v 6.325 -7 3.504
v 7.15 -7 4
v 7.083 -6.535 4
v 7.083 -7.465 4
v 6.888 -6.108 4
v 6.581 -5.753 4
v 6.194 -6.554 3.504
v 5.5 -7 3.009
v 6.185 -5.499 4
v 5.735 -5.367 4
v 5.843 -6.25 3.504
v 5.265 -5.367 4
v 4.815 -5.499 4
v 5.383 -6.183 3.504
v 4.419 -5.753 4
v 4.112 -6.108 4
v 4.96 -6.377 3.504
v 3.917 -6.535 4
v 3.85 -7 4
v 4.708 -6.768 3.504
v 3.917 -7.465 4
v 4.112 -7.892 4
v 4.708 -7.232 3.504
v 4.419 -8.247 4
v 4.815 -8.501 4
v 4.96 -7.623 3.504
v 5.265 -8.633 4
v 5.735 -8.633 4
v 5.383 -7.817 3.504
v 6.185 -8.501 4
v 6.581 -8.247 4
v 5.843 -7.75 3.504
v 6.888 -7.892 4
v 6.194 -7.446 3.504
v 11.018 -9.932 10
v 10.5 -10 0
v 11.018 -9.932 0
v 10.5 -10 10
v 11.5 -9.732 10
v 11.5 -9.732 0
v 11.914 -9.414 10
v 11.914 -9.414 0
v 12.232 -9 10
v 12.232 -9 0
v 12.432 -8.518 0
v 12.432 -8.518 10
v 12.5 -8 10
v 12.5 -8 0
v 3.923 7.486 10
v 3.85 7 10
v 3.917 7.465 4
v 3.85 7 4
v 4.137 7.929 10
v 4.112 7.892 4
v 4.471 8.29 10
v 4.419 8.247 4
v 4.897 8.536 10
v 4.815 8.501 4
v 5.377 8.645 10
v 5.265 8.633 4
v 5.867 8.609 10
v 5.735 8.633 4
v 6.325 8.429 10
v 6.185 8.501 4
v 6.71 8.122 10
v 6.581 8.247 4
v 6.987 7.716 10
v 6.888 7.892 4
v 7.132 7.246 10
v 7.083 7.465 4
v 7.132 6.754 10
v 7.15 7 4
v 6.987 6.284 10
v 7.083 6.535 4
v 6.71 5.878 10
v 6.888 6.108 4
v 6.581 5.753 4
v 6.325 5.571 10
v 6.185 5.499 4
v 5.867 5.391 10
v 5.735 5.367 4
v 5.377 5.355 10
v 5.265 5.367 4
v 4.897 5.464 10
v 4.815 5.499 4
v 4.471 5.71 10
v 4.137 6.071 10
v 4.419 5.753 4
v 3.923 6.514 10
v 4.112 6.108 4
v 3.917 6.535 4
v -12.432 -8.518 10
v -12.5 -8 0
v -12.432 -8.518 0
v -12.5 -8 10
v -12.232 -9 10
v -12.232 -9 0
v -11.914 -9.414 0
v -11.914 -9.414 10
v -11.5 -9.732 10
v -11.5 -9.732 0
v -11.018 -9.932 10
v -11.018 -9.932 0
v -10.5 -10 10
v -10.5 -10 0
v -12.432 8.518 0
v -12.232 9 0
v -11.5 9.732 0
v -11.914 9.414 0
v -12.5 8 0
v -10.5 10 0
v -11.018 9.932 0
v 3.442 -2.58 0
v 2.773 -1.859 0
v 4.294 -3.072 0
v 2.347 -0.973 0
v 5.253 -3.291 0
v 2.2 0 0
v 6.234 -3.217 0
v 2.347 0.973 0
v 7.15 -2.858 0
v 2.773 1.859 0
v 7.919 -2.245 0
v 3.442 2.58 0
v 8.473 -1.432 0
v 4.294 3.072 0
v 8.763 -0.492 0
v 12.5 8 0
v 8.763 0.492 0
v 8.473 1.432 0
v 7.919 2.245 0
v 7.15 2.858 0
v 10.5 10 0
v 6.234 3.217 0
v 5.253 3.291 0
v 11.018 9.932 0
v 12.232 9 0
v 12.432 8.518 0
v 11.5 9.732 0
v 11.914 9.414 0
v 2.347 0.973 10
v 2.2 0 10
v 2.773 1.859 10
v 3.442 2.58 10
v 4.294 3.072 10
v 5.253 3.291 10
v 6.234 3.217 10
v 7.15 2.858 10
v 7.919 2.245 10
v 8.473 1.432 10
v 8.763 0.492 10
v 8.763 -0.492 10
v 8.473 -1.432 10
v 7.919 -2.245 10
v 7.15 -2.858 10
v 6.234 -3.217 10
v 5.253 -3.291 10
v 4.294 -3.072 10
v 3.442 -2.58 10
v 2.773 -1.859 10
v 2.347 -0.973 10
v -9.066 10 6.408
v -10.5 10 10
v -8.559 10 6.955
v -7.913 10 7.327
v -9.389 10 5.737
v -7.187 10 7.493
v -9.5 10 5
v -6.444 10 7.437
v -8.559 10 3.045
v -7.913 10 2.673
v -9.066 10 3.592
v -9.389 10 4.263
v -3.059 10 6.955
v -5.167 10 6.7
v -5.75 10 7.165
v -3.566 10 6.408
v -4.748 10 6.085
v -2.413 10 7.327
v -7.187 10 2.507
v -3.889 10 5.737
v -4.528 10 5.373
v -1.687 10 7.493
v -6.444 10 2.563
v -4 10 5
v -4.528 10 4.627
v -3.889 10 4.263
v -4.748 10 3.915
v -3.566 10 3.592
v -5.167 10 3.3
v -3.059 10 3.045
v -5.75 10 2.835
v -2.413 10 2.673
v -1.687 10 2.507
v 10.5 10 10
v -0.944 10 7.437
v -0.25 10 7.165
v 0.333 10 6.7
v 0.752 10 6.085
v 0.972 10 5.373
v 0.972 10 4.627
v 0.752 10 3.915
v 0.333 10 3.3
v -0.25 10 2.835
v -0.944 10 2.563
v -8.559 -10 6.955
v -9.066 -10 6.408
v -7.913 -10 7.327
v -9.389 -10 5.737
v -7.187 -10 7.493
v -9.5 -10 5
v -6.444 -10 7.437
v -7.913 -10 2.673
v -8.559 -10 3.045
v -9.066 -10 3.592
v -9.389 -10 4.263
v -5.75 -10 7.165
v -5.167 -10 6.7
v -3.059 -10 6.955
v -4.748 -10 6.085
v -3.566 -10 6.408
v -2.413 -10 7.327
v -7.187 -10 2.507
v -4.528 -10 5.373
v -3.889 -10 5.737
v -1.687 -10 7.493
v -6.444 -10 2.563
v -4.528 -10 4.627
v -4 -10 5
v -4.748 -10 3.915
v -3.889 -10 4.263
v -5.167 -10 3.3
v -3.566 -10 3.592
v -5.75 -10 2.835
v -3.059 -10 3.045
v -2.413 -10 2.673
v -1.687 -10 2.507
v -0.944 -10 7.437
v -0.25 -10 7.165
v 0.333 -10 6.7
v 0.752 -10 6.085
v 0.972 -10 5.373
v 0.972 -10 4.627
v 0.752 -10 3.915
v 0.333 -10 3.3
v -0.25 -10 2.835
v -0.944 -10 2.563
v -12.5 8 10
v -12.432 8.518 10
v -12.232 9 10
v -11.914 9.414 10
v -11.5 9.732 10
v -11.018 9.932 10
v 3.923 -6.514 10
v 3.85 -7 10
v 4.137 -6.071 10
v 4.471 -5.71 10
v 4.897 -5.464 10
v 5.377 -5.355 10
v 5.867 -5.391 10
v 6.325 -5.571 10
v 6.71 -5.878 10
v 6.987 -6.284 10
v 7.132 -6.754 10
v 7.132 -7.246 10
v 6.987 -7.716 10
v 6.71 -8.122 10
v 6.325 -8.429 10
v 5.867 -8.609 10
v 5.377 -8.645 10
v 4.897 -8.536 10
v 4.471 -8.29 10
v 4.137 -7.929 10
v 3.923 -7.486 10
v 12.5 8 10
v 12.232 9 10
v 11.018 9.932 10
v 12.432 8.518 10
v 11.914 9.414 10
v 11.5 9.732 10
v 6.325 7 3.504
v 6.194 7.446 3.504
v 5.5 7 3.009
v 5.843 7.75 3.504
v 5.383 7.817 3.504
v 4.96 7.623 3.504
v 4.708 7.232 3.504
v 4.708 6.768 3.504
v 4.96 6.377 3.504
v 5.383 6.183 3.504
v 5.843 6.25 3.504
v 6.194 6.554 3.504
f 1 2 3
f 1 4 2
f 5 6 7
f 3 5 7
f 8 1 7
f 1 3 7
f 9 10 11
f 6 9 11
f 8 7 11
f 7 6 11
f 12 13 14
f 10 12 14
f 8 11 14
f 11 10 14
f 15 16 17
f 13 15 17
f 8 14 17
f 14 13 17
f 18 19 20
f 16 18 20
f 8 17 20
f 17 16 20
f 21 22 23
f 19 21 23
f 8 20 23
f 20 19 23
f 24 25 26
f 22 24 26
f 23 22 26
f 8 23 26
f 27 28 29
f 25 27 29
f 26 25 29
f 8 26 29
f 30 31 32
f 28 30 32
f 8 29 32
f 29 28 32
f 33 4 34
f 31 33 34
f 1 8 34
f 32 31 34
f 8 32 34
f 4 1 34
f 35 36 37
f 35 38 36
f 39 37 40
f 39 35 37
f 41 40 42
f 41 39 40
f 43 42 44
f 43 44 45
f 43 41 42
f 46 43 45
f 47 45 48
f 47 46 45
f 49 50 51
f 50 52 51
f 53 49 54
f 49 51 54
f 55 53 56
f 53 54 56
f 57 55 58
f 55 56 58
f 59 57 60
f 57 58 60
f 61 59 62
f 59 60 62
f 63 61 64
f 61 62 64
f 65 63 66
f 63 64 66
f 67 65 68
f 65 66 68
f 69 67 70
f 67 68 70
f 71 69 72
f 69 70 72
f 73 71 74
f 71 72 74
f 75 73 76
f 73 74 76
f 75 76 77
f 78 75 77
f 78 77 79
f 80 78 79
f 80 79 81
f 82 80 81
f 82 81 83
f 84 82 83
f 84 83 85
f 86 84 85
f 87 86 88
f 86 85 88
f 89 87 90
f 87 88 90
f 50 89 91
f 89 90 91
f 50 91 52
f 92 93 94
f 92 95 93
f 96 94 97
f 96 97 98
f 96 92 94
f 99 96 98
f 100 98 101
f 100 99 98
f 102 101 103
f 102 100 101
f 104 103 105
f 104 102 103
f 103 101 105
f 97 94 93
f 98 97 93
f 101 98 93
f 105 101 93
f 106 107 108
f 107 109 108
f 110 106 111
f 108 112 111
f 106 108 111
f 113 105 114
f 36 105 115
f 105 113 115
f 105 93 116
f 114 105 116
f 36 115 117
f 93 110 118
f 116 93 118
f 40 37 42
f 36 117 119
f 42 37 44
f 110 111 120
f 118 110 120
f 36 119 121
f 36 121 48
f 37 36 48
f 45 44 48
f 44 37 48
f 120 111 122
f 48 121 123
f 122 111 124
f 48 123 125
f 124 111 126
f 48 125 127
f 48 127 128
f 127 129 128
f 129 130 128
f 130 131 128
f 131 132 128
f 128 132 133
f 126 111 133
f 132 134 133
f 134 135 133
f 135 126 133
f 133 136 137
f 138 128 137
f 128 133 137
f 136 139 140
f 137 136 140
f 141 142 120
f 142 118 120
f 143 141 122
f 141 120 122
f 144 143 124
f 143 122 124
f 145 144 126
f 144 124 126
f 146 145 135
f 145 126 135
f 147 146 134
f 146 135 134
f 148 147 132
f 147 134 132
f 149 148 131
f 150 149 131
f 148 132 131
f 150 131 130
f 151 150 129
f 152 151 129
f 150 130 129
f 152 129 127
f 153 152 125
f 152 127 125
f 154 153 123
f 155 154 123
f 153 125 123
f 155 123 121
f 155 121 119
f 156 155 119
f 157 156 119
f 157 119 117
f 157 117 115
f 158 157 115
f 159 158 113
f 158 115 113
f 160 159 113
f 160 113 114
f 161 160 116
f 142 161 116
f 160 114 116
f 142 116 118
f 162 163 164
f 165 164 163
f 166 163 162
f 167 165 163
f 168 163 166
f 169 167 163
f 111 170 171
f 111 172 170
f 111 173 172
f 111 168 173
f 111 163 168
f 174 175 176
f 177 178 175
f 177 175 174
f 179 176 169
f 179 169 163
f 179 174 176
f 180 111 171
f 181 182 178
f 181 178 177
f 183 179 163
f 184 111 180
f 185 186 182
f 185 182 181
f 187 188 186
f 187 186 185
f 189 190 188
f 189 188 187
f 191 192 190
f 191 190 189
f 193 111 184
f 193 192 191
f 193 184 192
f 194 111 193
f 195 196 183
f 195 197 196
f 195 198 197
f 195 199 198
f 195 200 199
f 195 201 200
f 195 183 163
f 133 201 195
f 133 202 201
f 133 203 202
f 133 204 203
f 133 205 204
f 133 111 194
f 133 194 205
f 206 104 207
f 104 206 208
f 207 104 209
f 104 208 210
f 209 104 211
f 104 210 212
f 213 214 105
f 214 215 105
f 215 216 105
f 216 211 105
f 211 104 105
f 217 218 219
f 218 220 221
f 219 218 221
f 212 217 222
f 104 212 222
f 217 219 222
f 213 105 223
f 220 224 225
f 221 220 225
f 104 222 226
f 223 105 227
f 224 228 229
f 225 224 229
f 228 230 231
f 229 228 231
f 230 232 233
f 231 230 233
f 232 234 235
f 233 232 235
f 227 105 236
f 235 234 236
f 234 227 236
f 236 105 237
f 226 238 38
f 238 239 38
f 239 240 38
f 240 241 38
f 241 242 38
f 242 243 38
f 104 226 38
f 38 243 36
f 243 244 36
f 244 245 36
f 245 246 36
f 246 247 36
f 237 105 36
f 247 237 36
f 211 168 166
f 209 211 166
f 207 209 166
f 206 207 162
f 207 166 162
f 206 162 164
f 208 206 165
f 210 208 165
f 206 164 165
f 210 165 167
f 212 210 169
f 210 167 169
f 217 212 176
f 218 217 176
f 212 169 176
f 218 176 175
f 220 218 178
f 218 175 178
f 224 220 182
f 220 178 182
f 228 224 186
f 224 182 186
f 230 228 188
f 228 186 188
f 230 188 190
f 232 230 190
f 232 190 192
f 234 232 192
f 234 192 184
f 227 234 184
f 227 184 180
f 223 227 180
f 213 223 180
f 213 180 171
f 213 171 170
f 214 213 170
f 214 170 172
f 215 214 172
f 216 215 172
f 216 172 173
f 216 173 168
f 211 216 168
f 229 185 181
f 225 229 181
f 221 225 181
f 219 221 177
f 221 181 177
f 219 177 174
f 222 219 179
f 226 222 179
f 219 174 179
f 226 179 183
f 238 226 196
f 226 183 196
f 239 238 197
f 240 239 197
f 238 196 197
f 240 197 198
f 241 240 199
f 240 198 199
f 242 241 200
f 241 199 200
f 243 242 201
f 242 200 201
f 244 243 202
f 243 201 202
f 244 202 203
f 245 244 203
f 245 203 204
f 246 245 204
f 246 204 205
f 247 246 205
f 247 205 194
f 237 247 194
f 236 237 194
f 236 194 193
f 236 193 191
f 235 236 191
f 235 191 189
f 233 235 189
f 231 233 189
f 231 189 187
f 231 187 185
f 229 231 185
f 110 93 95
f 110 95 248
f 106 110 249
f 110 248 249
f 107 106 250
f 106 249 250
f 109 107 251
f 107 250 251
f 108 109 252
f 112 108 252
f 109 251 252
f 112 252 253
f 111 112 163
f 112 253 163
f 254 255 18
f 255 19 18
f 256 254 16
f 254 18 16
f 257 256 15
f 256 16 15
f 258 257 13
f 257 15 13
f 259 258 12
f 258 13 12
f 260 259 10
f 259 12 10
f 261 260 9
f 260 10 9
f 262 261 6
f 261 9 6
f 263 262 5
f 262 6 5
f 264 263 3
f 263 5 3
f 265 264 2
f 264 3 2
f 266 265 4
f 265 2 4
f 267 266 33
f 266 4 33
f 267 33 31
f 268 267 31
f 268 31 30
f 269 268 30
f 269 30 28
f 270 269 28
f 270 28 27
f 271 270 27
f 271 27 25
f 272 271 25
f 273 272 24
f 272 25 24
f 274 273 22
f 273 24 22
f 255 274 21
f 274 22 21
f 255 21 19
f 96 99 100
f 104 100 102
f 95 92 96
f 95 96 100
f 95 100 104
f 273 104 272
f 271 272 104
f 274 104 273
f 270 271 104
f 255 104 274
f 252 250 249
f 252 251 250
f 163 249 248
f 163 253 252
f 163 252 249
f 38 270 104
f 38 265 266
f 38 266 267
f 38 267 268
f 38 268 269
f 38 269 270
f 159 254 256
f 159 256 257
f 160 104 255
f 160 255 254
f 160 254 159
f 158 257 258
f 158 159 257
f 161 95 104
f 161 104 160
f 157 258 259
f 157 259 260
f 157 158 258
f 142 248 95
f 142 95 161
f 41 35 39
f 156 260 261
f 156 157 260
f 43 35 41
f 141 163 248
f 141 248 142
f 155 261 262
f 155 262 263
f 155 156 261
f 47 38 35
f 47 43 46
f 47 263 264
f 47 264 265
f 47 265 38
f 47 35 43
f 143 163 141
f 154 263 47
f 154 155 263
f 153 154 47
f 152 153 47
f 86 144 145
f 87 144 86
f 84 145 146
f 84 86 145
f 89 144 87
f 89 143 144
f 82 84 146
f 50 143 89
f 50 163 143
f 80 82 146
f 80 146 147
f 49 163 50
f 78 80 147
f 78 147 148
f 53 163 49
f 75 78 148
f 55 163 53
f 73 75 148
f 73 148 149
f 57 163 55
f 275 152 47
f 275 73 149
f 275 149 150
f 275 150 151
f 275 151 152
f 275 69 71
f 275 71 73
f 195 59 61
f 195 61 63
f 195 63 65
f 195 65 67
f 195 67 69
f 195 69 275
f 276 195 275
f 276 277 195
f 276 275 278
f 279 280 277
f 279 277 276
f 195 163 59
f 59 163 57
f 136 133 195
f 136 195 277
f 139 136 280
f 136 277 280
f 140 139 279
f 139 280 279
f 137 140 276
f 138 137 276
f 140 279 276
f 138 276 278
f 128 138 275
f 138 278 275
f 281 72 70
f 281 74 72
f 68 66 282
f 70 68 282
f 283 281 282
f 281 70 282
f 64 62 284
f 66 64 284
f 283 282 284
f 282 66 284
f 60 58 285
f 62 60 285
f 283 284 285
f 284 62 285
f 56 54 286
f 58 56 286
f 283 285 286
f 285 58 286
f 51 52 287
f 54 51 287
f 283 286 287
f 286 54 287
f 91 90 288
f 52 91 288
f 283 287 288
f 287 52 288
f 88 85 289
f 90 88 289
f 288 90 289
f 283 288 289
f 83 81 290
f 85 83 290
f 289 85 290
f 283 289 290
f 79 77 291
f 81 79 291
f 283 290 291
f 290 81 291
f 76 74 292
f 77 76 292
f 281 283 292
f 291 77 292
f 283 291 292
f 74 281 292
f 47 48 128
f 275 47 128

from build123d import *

# Parameters (mm, degrees)
F0_W     = 25
F0_H     = 20
F1_DEPTH = 10
F3_D     = 6.6
F3_DEPTH = 10
F3_TIP   = 1.9828400428
F5_D     = 5
F5_DEPTH = 30
F5_TIP   = 1.5021515476
F6_R     = 2
F8_D     = 3.3
F8_DEPTH = 6
F8_TIP   = 0.9914200214


with BuildPart() as f1:
    # F0 (on Top) → F1 (new body)
    with BuildSketch(Plane.XY):
        Rectangle(F0_W, F0_H)
    extrude(amount=F1_DEPTH)

    # F3
    with Locations(Plane.XY.offset(10)):
        with Locations((5.5, 0)):
            Hole(F3_D / 2, depth=F3_DEPTH)
            with Locations((0, 0, -(F3_DEPTH + F3_TIP / 2))):  # 118° drill point
                Cone(0, F3_D / 2, F3_TIP, mode=Mode.SUBTRACT)

    # F5
    with Locations(Plane.XZ.offset(10)):
        with Locations((-7, 5), (-1.5, 5)):
            Hole(F5_D / 2, depth=F5_DEPTH)
            with Locations((0, 0, -(F5_DEPTH + F5_TIP / 2))):  # 118° drill point
                Cone(0, F5_D / 2, F5_TIP, mode=Mode.SUBTRACT)

    # F6
    f6_edges = [f1.edges().sort_by_distance(p)[0] for p in [
        (-12.5, -10, 5),
        (-12.5, 10, 5),
        (12.5, -10, 5),
        (12.5, 10, 5),
    ]]
    fillet(f6_edges, radius=F6_R)

    # F8
    with Locations(Plane.XY.offset(10)):
        with Locations((5.5, 7), (5.5, -7)):
            Hole(F8_D / 2, depth=F8_DEPTH)
            with Locations((0, 0, -(F8_DEPTH + F8_TIP / 2))):  # 118° drill point
                Cone(0, F8_D / 2, F8_TIP, mode=Mode.SUBTRACT)


solid = f1.part
